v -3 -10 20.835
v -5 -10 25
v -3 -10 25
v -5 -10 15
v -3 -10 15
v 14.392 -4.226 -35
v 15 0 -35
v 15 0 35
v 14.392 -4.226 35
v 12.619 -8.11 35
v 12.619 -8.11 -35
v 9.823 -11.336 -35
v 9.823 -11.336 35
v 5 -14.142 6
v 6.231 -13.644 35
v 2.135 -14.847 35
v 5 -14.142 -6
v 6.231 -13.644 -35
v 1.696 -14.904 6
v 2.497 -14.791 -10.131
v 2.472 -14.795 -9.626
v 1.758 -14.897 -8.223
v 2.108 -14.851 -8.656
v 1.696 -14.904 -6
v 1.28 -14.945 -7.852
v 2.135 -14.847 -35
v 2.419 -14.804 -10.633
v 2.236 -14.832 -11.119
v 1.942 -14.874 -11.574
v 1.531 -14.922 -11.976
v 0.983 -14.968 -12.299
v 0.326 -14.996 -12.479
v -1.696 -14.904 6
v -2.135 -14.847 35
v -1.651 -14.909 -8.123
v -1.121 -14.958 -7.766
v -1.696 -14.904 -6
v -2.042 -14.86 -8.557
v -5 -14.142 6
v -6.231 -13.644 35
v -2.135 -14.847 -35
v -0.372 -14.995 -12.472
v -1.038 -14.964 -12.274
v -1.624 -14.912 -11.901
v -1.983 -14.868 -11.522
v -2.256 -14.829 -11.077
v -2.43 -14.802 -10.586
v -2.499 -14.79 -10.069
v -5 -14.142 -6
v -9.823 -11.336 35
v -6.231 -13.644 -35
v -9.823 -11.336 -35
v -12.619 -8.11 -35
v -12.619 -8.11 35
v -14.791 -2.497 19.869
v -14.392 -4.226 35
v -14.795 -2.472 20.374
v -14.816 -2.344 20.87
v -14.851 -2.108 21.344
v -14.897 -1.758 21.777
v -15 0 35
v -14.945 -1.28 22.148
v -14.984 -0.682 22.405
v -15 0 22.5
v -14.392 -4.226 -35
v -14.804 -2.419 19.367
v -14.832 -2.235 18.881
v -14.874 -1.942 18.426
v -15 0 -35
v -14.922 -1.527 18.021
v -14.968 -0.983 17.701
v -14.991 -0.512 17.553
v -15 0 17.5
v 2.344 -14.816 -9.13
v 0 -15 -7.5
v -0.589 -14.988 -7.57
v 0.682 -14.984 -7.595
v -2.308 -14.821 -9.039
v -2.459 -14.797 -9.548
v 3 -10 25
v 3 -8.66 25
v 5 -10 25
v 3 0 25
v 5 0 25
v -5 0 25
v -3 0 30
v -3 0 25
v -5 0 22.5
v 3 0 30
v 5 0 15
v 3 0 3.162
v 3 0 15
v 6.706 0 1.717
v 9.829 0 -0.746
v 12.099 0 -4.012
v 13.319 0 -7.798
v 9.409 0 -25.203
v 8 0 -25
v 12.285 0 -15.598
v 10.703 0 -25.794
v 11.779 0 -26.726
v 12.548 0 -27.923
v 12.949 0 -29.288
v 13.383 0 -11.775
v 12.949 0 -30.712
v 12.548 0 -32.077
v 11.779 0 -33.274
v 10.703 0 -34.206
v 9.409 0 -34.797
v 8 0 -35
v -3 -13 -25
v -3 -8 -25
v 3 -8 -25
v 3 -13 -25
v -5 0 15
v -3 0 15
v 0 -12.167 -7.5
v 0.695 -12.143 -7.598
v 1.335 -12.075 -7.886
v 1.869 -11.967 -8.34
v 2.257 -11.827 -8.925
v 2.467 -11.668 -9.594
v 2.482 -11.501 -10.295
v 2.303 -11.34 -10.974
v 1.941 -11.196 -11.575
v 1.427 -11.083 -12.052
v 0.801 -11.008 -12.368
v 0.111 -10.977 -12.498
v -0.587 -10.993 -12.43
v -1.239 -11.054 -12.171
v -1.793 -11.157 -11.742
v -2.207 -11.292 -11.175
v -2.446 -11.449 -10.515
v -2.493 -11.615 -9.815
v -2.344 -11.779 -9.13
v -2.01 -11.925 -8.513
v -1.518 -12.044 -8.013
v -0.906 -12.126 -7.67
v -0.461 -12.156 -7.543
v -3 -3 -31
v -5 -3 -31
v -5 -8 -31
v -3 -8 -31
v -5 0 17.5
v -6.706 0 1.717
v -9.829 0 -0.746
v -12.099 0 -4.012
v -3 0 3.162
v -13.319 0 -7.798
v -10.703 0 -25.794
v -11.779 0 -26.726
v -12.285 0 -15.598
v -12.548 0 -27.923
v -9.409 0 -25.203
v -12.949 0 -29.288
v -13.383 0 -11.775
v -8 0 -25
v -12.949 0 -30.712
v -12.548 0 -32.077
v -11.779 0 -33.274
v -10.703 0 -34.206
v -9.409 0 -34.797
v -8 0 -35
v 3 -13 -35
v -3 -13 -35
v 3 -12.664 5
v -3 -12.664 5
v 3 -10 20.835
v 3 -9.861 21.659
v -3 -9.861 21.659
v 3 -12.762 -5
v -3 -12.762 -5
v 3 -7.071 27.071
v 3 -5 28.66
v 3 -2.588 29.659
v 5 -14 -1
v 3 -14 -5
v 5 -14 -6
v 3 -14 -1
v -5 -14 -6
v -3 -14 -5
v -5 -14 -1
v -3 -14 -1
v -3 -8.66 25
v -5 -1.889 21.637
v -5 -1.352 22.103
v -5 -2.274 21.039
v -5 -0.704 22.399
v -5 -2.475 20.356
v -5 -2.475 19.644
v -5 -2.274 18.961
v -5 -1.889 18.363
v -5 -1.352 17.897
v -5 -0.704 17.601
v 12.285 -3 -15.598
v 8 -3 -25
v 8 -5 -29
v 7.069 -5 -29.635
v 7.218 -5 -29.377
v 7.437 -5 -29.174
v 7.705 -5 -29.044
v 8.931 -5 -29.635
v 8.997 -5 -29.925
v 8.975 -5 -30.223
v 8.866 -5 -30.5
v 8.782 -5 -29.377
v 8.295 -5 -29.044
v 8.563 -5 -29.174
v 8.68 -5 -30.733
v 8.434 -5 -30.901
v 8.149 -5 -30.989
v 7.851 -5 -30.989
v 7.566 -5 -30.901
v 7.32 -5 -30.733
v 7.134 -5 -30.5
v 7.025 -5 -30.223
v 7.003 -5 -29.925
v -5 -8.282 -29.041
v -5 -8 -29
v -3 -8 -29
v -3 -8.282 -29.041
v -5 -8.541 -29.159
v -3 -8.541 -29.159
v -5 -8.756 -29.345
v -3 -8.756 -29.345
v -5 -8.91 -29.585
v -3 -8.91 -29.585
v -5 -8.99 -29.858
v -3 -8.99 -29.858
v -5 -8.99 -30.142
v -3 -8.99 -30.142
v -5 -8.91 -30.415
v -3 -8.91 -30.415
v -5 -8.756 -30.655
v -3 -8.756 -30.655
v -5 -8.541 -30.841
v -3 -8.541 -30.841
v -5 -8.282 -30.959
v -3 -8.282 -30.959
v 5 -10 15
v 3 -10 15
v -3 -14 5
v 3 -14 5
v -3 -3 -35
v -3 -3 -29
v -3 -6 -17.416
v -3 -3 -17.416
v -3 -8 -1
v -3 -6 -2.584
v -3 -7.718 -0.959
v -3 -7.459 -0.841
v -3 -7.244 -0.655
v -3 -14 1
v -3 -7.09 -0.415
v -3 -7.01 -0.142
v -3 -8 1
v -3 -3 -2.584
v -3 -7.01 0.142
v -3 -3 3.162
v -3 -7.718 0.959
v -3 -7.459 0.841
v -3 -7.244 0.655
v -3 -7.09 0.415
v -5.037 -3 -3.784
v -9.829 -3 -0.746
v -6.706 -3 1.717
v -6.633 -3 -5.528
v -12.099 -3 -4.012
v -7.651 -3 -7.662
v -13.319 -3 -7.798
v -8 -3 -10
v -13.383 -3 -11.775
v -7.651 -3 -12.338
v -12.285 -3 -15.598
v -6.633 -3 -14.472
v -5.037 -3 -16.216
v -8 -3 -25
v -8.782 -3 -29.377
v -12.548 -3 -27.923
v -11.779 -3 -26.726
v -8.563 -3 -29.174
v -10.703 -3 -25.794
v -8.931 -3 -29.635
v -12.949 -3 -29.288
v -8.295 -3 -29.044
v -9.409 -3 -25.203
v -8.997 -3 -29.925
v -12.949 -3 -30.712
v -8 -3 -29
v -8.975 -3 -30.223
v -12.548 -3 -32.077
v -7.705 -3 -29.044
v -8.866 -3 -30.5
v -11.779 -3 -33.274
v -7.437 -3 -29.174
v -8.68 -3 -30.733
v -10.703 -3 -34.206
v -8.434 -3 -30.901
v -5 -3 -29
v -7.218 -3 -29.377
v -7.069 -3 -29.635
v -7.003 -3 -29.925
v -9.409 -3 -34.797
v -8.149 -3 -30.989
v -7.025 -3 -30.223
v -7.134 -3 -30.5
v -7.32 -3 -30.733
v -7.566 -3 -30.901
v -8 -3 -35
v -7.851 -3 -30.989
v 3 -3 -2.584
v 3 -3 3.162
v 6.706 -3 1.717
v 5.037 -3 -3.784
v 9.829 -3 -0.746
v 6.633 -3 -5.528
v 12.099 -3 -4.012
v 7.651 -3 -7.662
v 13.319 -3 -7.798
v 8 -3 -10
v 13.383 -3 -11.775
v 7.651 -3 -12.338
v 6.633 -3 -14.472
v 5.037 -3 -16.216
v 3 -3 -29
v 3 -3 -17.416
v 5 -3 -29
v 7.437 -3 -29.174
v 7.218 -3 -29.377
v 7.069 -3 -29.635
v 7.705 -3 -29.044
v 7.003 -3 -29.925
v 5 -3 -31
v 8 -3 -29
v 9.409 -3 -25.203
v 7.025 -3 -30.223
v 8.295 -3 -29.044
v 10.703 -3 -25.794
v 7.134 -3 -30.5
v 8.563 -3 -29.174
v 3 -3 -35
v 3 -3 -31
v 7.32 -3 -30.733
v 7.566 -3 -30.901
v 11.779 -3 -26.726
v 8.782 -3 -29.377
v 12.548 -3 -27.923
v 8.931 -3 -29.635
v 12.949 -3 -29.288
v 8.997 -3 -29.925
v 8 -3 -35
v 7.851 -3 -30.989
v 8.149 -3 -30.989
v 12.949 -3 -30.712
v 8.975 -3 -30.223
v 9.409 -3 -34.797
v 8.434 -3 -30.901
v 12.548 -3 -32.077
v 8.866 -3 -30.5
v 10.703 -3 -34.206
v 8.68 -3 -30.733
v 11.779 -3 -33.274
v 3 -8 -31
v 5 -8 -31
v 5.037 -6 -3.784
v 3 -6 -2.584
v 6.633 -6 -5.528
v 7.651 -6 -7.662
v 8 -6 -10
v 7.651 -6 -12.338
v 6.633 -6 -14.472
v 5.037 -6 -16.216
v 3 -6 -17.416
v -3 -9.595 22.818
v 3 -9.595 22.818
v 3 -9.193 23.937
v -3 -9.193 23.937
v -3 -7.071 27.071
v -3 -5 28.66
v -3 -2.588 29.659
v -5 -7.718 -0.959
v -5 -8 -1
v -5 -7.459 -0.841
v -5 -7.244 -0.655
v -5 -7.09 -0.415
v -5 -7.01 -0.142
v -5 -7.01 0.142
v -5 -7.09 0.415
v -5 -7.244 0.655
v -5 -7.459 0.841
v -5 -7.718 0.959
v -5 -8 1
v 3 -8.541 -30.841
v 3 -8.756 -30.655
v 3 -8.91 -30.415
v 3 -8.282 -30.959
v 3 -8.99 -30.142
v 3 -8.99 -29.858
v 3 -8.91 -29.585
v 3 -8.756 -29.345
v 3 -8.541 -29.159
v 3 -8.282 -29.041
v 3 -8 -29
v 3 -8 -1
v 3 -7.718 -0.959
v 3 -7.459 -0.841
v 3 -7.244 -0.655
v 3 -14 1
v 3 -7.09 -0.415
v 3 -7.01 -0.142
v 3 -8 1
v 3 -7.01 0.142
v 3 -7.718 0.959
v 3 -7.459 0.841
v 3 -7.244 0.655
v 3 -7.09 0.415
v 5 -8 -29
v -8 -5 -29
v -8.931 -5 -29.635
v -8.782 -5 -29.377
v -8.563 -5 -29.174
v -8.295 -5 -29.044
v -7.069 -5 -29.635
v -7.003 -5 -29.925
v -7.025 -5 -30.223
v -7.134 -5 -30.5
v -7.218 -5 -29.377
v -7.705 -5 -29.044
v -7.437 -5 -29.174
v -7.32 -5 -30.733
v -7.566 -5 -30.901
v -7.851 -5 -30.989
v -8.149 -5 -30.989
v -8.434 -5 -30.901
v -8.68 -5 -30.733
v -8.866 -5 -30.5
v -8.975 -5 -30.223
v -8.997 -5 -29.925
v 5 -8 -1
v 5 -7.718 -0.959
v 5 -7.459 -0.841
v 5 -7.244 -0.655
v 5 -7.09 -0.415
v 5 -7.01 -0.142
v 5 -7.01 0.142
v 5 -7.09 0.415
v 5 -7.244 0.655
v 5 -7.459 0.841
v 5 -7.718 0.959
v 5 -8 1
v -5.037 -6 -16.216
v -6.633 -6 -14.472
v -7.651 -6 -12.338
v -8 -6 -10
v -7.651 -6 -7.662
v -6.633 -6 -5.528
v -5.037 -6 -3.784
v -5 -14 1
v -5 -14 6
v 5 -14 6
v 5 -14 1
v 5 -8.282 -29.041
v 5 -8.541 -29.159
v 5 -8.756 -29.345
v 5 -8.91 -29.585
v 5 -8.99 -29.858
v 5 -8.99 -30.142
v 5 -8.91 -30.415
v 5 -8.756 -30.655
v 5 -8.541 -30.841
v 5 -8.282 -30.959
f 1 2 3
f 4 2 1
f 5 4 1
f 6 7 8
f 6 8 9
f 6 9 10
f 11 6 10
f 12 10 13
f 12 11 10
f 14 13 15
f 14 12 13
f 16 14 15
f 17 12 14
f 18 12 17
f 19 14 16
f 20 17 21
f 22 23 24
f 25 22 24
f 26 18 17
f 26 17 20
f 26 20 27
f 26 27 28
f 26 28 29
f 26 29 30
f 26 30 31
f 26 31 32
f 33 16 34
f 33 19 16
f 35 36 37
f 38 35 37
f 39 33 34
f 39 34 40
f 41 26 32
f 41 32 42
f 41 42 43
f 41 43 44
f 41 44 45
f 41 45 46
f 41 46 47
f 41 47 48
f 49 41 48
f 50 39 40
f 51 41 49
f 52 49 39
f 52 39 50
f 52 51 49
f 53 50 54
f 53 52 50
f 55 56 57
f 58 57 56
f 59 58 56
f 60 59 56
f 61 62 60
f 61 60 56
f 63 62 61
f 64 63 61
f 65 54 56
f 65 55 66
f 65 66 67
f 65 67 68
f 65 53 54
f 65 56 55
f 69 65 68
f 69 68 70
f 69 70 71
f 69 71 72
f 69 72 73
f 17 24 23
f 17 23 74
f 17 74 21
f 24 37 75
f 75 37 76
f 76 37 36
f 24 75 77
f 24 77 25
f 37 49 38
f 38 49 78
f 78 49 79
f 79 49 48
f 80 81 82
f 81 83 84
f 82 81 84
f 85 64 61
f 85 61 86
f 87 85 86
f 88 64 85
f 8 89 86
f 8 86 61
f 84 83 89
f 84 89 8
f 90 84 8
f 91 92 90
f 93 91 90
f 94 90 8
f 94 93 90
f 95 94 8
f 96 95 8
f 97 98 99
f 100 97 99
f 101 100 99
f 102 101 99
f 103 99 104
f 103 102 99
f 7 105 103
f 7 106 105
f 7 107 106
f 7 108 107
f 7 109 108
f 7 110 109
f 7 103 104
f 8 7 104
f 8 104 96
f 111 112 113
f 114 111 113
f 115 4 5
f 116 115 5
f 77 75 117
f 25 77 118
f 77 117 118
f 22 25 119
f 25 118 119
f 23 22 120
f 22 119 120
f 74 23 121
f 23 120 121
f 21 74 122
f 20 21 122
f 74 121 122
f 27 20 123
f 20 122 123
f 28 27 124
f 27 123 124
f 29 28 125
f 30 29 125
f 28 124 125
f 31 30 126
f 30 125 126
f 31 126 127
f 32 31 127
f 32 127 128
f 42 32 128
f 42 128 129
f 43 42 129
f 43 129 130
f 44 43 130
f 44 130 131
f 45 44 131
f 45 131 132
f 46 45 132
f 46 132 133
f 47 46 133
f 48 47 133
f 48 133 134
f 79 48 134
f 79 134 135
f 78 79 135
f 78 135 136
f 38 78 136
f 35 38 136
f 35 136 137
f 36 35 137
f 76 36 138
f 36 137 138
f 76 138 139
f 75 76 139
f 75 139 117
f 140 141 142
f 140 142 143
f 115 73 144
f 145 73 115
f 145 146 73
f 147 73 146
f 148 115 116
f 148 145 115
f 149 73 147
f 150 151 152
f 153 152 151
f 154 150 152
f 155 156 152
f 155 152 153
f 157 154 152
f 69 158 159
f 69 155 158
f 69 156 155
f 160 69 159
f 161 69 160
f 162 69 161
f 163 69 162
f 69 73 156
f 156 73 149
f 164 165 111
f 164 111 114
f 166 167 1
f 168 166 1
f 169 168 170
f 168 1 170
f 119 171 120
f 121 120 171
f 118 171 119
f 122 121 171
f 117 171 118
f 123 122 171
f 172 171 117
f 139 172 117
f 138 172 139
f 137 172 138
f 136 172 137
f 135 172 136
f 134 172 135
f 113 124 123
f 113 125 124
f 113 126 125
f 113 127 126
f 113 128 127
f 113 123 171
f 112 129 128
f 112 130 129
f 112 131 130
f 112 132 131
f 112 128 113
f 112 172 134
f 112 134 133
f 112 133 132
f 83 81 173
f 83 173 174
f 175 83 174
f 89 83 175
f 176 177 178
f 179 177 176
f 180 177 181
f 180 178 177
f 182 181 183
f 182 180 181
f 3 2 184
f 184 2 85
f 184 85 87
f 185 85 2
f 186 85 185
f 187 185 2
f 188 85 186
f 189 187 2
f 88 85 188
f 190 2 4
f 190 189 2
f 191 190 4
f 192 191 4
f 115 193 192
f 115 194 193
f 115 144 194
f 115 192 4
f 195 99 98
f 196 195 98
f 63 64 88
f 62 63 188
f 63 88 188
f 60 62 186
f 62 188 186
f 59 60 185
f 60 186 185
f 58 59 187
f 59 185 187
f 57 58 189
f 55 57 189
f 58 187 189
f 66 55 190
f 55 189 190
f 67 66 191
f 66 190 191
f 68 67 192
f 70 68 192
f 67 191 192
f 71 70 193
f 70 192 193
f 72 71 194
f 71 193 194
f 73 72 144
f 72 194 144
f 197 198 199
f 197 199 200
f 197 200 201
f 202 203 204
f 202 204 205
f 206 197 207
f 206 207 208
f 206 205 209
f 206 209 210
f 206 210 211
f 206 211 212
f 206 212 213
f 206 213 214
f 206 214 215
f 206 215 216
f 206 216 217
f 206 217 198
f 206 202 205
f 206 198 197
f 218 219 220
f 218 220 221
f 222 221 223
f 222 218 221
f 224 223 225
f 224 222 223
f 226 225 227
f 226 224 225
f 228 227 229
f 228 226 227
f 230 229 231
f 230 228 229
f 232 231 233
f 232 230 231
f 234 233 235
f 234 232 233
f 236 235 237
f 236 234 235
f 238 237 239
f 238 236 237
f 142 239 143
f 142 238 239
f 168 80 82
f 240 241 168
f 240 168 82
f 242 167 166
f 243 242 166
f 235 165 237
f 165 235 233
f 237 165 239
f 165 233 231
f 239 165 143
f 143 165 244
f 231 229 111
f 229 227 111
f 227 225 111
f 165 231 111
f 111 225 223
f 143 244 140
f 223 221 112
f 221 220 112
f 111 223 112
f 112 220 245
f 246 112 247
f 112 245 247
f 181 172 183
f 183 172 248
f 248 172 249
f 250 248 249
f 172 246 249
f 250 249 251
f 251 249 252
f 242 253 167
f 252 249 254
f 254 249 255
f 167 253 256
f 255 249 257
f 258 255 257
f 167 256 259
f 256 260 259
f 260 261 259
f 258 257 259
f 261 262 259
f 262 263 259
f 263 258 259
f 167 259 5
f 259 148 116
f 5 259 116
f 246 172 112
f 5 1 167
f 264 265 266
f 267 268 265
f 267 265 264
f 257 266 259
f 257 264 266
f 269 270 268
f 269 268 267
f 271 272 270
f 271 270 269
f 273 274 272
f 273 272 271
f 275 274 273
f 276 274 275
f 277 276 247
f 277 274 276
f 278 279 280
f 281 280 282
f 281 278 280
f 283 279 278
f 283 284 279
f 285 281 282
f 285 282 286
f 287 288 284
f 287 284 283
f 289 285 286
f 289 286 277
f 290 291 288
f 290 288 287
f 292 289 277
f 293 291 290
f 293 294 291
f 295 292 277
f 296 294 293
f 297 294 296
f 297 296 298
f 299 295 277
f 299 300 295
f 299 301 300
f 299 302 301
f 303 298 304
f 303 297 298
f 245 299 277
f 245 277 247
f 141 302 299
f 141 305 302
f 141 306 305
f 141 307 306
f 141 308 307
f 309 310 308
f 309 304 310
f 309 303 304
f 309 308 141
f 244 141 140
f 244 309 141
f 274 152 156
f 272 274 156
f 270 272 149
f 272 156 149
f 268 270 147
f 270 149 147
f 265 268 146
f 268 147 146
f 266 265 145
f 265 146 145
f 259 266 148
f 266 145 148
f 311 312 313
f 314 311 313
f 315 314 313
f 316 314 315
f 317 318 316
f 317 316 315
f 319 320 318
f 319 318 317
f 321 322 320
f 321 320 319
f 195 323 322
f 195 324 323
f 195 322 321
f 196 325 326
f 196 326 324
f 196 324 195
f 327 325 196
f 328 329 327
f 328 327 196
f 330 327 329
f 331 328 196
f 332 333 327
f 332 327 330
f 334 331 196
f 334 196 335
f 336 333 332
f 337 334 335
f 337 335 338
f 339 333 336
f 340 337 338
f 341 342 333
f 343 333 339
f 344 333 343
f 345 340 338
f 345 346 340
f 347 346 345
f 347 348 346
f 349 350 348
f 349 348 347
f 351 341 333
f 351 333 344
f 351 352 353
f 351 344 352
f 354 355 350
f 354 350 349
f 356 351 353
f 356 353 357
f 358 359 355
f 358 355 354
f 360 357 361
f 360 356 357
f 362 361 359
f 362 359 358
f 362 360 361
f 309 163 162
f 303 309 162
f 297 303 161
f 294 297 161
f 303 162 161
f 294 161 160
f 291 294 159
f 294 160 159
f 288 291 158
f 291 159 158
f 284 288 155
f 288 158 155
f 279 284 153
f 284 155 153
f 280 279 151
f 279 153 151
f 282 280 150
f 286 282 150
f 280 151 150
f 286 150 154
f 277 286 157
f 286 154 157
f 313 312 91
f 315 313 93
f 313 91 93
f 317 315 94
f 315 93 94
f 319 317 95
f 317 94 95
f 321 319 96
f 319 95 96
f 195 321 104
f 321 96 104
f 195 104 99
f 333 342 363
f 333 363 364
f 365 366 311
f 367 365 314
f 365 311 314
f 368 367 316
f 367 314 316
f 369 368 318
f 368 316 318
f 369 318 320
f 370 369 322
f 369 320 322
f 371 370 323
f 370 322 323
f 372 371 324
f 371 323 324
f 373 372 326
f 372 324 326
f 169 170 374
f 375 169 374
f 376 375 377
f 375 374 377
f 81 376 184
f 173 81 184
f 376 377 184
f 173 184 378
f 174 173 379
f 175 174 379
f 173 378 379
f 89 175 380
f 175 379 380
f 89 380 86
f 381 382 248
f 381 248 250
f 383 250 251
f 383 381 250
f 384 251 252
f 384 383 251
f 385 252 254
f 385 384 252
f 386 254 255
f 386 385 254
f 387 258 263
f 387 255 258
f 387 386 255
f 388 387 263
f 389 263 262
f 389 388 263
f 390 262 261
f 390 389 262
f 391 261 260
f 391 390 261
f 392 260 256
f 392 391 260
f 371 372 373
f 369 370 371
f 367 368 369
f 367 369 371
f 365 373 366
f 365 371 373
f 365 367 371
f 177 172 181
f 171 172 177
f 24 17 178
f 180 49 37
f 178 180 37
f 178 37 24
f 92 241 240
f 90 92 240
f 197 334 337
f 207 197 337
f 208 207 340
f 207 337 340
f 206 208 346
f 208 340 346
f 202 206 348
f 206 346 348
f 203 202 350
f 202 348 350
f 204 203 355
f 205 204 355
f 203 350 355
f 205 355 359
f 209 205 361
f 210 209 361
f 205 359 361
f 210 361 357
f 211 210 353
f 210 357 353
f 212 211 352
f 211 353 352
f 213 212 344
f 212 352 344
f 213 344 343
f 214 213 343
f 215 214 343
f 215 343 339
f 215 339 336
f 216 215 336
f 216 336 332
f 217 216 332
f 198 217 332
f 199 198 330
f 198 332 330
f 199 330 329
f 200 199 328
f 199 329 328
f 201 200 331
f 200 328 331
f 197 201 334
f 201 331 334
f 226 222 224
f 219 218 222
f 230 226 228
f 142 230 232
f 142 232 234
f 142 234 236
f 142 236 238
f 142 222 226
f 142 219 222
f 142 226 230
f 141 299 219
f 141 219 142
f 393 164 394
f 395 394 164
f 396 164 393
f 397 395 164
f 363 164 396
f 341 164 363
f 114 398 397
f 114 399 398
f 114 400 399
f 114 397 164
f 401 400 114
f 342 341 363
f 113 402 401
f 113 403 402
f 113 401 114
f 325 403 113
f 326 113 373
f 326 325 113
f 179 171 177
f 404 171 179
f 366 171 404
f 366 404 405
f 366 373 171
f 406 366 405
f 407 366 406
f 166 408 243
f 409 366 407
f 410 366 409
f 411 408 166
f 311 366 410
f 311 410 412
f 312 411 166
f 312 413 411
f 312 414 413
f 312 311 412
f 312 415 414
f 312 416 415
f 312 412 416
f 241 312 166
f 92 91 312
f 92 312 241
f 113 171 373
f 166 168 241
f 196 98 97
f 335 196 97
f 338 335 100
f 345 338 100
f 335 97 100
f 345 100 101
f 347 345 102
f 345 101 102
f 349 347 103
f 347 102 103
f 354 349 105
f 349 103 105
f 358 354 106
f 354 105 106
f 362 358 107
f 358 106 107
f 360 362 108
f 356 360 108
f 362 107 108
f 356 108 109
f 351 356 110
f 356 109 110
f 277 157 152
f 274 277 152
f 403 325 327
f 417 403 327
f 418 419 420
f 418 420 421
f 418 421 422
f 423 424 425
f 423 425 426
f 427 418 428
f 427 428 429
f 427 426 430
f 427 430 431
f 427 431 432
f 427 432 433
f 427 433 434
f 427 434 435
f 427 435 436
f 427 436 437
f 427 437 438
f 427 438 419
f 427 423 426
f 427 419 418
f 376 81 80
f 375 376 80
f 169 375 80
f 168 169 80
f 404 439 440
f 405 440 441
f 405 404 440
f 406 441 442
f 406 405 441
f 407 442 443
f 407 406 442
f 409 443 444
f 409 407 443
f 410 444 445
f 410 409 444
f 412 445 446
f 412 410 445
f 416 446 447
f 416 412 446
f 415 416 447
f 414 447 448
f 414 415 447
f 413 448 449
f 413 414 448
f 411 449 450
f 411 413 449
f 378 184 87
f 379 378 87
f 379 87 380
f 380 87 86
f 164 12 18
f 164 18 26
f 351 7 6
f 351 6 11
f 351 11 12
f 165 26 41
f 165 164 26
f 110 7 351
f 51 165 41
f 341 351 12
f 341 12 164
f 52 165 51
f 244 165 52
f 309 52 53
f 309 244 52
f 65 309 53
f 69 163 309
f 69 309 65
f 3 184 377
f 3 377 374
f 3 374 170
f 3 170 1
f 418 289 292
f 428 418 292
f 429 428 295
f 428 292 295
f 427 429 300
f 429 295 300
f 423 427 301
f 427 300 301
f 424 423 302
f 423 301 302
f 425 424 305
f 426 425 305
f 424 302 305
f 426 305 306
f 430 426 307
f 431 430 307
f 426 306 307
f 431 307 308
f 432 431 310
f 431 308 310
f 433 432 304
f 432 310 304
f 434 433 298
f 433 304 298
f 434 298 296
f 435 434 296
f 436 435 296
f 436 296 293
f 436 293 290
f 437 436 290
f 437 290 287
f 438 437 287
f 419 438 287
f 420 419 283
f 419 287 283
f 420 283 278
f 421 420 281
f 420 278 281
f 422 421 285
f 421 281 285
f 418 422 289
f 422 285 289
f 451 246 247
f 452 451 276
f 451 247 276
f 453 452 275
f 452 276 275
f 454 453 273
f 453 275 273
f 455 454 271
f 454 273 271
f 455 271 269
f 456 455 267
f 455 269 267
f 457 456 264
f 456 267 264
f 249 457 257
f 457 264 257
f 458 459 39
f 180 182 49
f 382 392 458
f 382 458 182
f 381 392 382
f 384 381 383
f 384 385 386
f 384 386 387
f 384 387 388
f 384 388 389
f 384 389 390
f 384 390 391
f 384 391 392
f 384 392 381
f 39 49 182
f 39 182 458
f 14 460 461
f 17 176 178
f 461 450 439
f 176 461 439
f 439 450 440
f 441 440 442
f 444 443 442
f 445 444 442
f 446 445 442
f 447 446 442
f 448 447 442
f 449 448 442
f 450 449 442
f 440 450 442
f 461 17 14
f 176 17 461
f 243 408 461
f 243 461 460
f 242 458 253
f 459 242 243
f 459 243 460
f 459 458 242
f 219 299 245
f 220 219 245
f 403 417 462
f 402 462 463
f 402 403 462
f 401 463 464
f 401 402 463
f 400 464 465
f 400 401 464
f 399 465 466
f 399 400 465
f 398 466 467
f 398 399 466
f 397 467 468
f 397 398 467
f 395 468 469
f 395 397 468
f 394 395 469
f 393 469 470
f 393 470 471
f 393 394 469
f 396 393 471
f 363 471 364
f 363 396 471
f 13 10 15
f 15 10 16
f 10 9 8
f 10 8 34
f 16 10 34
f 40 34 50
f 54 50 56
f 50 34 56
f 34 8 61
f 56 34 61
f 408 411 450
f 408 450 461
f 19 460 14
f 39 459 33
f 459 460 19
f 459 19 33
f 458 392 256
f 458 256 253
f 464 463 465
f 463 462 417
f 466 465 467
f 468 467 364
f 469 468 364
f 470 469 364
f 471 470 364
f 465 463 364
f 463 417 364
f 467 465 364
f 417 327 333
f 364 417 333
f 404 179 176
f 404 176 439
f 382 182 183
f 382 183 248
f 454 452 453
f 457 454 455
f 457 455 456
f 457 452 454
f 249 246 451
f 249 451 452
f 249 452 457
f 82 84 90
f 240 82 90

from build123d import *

# Parameters (mm, degrees)
SALIENTE_EXTRUIR1_DEPTH      = 35
SALIENTE_EXTRUIR1_DEPTH_BACK = 35
CORTAR_EXTRUIR1_DEPTH        = 3
CROQUIS4_R                   = 8
CORTAR_EXTRUIR2_DEPTH        = 3
CROQUIS5_R                   = 2.5
CORTAR_EXTRUIR3_DEPTH        = 10
CROQUIS6_W                   = 6
CROQUIS6_H                   = 10
CORTAR_EXTRUIR5_DEPTH        = 10
CROQUIS7_W                   = 2
CROQUIS7_H                   = 2
CORTAR_EXTRUIR6_DEPTH        = 5
CROQUIS8_R                   = 1
CORTAR_EXTRUIR7_DEPTH        = 2
CROQUIS9_W                   = 6
CROQUIS9_H                   = 10
CORTAR_EXTRUIR8_DEPTH        = 12
CORTAR_EXTRUIR9_DEPTH        = 5
CORTAR_EXTRUIR9_DEPTH_BACK   = 5
CROQUIS10_R                  = 1
CORTAR_EXTRUIR10_DEPTH       = 5
CORTAR_EXTRUIR10_DEPTH_BACK  = 5
CORTAR_EXTRUIR11_DEPTH       = 3
CORTAR_EXTRUIR11_DEPTH_BACK  = 3
CROQUIS15_R                  = 2.5
CORTAR_EXTRUIR12_DEPTH       = 15
CROQUIS14_W                  = 2
CROQUIS14_H                  = 10
CORTAR_EXTRUIR13_DEPTH       = 10


with BuildPart() as part:
    # Croquis1 → Saliente-Extruir1 (new, two sides: drawn at the far end of the back side and taken through both)
    with BuildSketch(Plane.XY.offset(-SALIENTE_EXTRUIR1_DEPTH_BACK)):
        with BuildLine():
            Line((-15, 0), (15, 0))
            ThreePointArc((15, 0), (0, -15), (-15, 0))
        make_face()
    extrude(amount=SALIENTE_EXTRUIR1_DEPTH + SALIENTE_EXTRUIR1_DEPTH_BACK)

    # Croquis3 → Cortar-Extruir1 (cut)
    with BuildSketch(Plane(origin=(0, 0, 0), x_dir=(1, 0, 0), z_dir=(0, 1, 0))):
        with BuildLine():
            Line((-8, 25), (-12.284525276, 15.598253186))
            ThreePointArc((-12.284525276, 15.598253186), (0, -3.5), (12.284525276, 15.598253186))
            Line((12.284525276, 15.598253186), (8, 25))
            ThreePointArc((8, 25), (13, 30), (8, 35))
            Line((8, 35), (-8, 35))
            ThreePointArc((-8, 35), (-13, 30), (-8, 25))
        make_face()
    extrude(amount=-CORTAR_EXTRUIR1_DEPTH, mode=Mode.SUBTRACT)

    # Croquis4 → Cortar-Extruir2 (cut)
    with BuildSketch(Plane(origin=(0, -3, 0), x_dir=(1, 0, 0), z_dir=(0, 1, 0))):
        with Locations((0, 10)):
            Circle(CROQUIS4_R)
    extrude(amount=-CORTAR_EXTRUIR2_DEPTH, mode=Mode.SUBTRACT)

    # Croquis5 → Cortar-Extruir3 (cut)
    with BuildSketch(Plane(origin=(0, -6, 0), x_dir=(1, 0, 0), z_dir=(0, 1, 0))):
        with Locations((0, 10)):
            Circle(CROQUIS5_R)
    extrude(amount=-CORTAR_EXTRUIR3_DEPTH, mode=Mode.SUBTRACT)

    # Croquis6 → Cortar-Extruir5 (cut)
    with BuildSketch(Plane(origin=(0, -3, 0), x_dir=(1, 0, 0), z_dir=(0, 1, 0))):
        with Locations((0, 30)):
            Rectangle(CROQUIS6_W, CROQUIS6_H)
    extrude(amount=-CORTAR_EXTRUIR5_DEPTH, mode=Mode.SUBTRACT)

    # Croquis7 → Cortar-Extruir6 (cut)
    with BuildSketch(Plane(origin=(0, -3, 0), x_dir=(1, 0, 0), z_dir=(0, 1, 0))):
        with Locations((-4, 30)):
            Rectangle(CROQUIS7_W, CROQUIS7_H)
        with Locations((4, 30)):
            Rectangle(CROQUIS7_W, CROQUIS7_H)
    extrude(amount=-CORTAR_EXTRUIR6_DEPTH, mode=Mode.SUBTRACT)

    # Croquis8 → Cortar-Extruir7 (cut)
    with BuildSketch(Plane(origin=(0, -3, 0), x_dir=(1, 0, 0), z_dir=(0, 1, 0))):
        with Locations((-8, 30)):
            Circle(CROQUIS8_R)
        with Locations((8, 30)):
            Circle(CROQUIS8_R)
    extrude(amount=-CORTAR_EXTRUIR7_DEPTH, mode=Mode.SUBTRACT)

    # Croquis9 → Cortar-Extruir8 (cut)
    with BuildSketch(Plane(origin=(0, -3, 0), x_dir=(1, 0, 0), z_dir=(0, 1, 0))):
        Rectangle(CROQUIS9_W, CROQUIS9_H)
    extrude(amount=-CORTAR_EXTRUIR8_DEPTH, mode=Mode.SUBTRACT)

    # Croquis10 → Cortar-Extruir9 (cut, two sides: drawn at the far end of the back side and taken through both)
    with BuildSketch(Plane(origin=(0, 0, 0), x_dir=(0, 0, -1), z_dir=(1, 0, 0)).offset(-CORTAR_EXTRUIR9_DEPTH_BACK)):
        with Locations((30, -8)):
            Circle(CROQUIS10_R)
    extrude(amount=CORTAR_EXTRUIR9_DEPTH + CORTAR_EXTRUIR9_DEPTH_BACK, mode=Mode.SUBTRACT)

    # Croquis11 → Cortar-Extruir10 (cut, two sides: drawn at the far end of the back side and taken through both)
    with BuildSketch(Plane(origin=(0, 0, 0), x_dir=(0, 0, -1), z_dir=(1, 0, 0)).offset(-CORTAR_EXTRUIR10_DEPTH_BACK)):
        with BuildLine():
            Line((-6, -15), (6, -15))
            Line((6, -15), (6, -14))
            Line((6, -14), (1, -14))
            Line((1, -14), (1, -8))
            ThreePointArc((1, -8), (0, -7), (-1, -8))
            Line((-1, -8), (-1, -14))
            Line((-1, -14), (-6, -14))
            Line((-6, -14), (-6, -15))
        make_face()
    extrude(amount=CORTAR_EXTRUIR10_DEPTH + CORTAR_EXTRUIR10_DEPTH_BACK, mode=Mode.SUBTRACT)

    # Croquis12 → Cortar-Extruir11 (cut, two sides: drawn at the far end of the back side and taken through both)
    with BuildSketch(Plane(origin=(0, 0, 0), x_dir=(0, 0, -1), z_dir=(1, 0, 0)).offset(-CORTAR_EXTRUIR11_DEPTH_BACK)):
        with BuildLine():
            Line((-3, -13), (-21.658767316, -9.861464952))
            ThreePointArc((-21.658767316, -9.861464952), (-27.635040051, -6.458030924), (-30, 0))
            Line((-30, 0), (-3, 0))
            Line((-3, 0), (-3, -13))
        make_face()
        Polygon((25, -8), (25, -3), (4, -3), (4, -13), align=None)
    extrude(amount=CORTAR_EXTRUIR11_DEPTH + CORTAR_EXTRUIR11_DEPTH_BACK, mode=Mode.SUBTRACT)

    # Croquis15 → Cortar-Extruir12 (cut)
    with BuildSketch(Plane(origin=(0, 0, 0), x_dir=(0, 0, -1), z_dir=(1, 0, 0))):
        with Locations((-20, 0)):
            Circle(CROQUIS15_R)
    extrude(amount=-CORTAR_EXTRUIR12_DEPTH, mode=Mode.SUBTRACT)

    # Croquis14 → Cortar-Extruir13 (cut)
    with BuildSketch(Plane(origin=(0, 0, 0), x_dir=(1, 0, 0), z_dir=(0, 1, 0))):
        with Locations((4, -20)):
            Rectangle(CROQUIS14_W, CROQUIS14_H)
        with Locations((-4, -20)):
            Rectangle(CROQUIS14_W, CROQUIS14_H)
    extrude(amount=-CORTAR_EXTRUIR13_DEPTH, mode=Mode.SUBTRACT)


solid = part.part
